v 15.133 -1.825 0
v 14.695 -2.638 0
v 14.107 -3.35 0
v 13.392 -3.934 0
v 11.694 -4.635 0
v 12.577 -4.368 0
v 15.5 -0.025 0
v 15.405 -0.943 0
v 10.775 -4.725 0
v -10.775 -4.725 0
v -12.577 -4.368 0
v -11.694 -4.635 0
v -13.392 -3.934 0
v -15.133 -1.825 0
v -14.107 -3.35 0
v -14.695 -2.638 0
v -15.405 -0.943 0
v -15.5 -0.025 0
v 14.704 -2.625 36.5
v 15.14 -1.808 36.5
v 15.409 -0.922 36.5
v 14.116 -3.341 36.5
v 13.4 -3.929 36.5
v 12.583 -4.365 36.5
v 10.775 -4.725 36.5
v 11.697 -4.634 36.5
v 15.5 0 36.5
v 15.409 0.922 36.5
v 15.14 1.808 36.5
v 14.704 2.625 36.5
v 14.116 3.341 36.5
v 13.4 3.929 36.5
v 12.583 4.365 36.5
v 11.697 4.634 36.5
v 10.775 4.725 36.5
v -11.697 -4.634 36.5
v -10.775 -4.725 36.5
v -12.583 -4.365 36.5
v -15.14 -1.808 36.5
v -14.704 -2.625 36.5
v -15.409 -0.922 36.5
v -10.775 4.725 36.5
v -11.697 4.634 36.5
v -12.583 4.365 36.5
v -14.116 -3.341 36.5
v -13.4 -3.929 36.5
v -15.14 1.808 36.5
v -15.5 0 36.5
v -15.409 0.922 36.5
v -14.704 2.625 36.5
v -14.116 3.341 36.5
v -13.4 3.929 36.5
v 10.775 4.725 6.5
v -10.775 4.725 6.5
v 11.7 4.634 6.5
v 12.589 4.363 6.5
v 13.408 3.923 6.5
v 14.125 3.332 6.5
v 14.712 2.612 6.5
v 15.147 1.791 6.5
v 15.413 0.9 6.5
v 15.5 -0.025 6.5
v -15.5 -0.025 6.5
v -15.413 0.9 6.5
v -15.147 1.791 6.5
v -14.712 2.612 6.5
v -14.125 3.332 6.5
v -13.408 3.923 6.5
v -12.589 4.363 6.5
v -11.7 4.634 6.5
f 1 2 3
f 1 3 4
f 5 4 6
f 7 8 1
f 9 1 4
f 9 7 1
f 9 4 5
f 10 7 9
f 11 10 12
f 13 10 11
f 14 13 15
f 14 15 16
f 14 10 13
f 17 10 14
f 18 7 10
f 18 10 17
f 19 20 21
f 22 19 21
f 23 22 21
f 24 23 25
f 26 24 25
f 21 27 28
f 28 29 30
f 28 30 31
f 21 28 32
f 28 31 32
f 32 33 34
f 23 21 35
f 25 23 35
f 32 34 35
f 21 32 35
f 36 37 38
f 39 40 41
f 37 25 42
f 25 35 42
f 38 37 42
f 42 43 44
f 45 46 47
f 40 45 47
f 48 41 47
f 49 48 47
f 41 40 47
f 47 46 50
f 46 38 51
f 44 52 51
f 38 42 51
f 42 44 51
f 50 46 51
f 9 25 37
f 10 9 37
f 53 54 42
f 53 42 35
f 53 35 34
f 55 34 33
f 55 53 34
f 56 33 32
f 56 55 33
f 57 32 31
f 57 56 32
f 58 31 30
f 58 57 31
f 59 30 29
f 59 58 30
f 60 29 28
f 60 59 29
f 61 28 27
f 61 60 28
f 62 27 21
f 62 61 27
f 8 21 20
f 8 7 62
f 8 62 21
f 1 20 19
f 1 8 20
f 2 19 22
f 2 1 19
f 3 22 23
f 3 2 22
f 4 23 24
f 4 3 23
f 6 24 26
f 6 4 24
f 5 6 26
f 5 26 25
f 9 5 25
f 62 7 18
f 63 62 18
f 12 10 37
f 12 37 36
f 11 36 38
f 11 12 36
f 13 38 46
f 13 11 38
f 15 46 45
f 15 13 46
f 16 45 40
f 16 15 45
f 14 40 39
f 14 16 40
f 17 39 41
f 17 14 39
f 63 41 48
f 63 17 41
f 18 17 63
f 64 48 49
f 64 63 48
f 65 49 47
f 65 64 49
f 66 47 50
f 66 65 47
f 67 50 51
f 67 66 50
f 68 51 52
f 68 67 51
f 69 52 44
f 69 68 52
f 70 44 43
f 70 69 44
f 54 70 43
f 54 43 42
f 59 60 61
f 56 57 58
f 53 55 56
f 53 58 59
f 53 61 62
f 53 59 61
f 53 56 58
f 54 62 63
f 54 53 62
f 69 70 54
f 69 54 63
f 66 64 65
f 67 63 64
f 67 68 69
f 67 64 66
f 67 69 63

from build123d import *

# Parameters (mm, degrees)
BATTERY_BASE_DEPTH = 36.5
PINS_DEPTH         = 6.5


with BuildPart() as part:
    # Battery Base Sketch → Battery Base (new body)
    with BuildSketch(Plane.XY):
        with BuildLine():
            Line((-10.775, 4.725), (10.775, 4.725))
            ThreePointArc((10.775, 4.725), (15.5, 0), (10.775, -4.725))
            Line((10.775, -4.725), (-10.775, -4.725))
            ThreePointArc((-10.775, -4.725), (-15.5, 0), (-10.775, 4.725))
        make_face()
    extrude(amount=BATTERY_BASE_DEPTH)

    # Pins Sketch → Pins (cut)
    with BuildSketch(Plane(origin=(0, 0, 0), x_dir=(-1, 0, 0), z_dir=(0, 0, -1))):
        with BuildLine():
            Line((-15.499933862, -0.025), (15.499933862, -0.025))
            ThreePointArc((15.499933862, -0.025), (14.124906715, 3.332228984), (10.775, 4.725))
            Line((10.775, 4.725), (-10.775, 4.725))
            ThreePointArc((-10.775, 4.725), (-14.124906715, 3.332228984), (-15.499933862, -0.025))
        make_face()
    extrude(amount=-PINS_DEPTH, mode=Mode.SUBTRACT)


solid = part.part
